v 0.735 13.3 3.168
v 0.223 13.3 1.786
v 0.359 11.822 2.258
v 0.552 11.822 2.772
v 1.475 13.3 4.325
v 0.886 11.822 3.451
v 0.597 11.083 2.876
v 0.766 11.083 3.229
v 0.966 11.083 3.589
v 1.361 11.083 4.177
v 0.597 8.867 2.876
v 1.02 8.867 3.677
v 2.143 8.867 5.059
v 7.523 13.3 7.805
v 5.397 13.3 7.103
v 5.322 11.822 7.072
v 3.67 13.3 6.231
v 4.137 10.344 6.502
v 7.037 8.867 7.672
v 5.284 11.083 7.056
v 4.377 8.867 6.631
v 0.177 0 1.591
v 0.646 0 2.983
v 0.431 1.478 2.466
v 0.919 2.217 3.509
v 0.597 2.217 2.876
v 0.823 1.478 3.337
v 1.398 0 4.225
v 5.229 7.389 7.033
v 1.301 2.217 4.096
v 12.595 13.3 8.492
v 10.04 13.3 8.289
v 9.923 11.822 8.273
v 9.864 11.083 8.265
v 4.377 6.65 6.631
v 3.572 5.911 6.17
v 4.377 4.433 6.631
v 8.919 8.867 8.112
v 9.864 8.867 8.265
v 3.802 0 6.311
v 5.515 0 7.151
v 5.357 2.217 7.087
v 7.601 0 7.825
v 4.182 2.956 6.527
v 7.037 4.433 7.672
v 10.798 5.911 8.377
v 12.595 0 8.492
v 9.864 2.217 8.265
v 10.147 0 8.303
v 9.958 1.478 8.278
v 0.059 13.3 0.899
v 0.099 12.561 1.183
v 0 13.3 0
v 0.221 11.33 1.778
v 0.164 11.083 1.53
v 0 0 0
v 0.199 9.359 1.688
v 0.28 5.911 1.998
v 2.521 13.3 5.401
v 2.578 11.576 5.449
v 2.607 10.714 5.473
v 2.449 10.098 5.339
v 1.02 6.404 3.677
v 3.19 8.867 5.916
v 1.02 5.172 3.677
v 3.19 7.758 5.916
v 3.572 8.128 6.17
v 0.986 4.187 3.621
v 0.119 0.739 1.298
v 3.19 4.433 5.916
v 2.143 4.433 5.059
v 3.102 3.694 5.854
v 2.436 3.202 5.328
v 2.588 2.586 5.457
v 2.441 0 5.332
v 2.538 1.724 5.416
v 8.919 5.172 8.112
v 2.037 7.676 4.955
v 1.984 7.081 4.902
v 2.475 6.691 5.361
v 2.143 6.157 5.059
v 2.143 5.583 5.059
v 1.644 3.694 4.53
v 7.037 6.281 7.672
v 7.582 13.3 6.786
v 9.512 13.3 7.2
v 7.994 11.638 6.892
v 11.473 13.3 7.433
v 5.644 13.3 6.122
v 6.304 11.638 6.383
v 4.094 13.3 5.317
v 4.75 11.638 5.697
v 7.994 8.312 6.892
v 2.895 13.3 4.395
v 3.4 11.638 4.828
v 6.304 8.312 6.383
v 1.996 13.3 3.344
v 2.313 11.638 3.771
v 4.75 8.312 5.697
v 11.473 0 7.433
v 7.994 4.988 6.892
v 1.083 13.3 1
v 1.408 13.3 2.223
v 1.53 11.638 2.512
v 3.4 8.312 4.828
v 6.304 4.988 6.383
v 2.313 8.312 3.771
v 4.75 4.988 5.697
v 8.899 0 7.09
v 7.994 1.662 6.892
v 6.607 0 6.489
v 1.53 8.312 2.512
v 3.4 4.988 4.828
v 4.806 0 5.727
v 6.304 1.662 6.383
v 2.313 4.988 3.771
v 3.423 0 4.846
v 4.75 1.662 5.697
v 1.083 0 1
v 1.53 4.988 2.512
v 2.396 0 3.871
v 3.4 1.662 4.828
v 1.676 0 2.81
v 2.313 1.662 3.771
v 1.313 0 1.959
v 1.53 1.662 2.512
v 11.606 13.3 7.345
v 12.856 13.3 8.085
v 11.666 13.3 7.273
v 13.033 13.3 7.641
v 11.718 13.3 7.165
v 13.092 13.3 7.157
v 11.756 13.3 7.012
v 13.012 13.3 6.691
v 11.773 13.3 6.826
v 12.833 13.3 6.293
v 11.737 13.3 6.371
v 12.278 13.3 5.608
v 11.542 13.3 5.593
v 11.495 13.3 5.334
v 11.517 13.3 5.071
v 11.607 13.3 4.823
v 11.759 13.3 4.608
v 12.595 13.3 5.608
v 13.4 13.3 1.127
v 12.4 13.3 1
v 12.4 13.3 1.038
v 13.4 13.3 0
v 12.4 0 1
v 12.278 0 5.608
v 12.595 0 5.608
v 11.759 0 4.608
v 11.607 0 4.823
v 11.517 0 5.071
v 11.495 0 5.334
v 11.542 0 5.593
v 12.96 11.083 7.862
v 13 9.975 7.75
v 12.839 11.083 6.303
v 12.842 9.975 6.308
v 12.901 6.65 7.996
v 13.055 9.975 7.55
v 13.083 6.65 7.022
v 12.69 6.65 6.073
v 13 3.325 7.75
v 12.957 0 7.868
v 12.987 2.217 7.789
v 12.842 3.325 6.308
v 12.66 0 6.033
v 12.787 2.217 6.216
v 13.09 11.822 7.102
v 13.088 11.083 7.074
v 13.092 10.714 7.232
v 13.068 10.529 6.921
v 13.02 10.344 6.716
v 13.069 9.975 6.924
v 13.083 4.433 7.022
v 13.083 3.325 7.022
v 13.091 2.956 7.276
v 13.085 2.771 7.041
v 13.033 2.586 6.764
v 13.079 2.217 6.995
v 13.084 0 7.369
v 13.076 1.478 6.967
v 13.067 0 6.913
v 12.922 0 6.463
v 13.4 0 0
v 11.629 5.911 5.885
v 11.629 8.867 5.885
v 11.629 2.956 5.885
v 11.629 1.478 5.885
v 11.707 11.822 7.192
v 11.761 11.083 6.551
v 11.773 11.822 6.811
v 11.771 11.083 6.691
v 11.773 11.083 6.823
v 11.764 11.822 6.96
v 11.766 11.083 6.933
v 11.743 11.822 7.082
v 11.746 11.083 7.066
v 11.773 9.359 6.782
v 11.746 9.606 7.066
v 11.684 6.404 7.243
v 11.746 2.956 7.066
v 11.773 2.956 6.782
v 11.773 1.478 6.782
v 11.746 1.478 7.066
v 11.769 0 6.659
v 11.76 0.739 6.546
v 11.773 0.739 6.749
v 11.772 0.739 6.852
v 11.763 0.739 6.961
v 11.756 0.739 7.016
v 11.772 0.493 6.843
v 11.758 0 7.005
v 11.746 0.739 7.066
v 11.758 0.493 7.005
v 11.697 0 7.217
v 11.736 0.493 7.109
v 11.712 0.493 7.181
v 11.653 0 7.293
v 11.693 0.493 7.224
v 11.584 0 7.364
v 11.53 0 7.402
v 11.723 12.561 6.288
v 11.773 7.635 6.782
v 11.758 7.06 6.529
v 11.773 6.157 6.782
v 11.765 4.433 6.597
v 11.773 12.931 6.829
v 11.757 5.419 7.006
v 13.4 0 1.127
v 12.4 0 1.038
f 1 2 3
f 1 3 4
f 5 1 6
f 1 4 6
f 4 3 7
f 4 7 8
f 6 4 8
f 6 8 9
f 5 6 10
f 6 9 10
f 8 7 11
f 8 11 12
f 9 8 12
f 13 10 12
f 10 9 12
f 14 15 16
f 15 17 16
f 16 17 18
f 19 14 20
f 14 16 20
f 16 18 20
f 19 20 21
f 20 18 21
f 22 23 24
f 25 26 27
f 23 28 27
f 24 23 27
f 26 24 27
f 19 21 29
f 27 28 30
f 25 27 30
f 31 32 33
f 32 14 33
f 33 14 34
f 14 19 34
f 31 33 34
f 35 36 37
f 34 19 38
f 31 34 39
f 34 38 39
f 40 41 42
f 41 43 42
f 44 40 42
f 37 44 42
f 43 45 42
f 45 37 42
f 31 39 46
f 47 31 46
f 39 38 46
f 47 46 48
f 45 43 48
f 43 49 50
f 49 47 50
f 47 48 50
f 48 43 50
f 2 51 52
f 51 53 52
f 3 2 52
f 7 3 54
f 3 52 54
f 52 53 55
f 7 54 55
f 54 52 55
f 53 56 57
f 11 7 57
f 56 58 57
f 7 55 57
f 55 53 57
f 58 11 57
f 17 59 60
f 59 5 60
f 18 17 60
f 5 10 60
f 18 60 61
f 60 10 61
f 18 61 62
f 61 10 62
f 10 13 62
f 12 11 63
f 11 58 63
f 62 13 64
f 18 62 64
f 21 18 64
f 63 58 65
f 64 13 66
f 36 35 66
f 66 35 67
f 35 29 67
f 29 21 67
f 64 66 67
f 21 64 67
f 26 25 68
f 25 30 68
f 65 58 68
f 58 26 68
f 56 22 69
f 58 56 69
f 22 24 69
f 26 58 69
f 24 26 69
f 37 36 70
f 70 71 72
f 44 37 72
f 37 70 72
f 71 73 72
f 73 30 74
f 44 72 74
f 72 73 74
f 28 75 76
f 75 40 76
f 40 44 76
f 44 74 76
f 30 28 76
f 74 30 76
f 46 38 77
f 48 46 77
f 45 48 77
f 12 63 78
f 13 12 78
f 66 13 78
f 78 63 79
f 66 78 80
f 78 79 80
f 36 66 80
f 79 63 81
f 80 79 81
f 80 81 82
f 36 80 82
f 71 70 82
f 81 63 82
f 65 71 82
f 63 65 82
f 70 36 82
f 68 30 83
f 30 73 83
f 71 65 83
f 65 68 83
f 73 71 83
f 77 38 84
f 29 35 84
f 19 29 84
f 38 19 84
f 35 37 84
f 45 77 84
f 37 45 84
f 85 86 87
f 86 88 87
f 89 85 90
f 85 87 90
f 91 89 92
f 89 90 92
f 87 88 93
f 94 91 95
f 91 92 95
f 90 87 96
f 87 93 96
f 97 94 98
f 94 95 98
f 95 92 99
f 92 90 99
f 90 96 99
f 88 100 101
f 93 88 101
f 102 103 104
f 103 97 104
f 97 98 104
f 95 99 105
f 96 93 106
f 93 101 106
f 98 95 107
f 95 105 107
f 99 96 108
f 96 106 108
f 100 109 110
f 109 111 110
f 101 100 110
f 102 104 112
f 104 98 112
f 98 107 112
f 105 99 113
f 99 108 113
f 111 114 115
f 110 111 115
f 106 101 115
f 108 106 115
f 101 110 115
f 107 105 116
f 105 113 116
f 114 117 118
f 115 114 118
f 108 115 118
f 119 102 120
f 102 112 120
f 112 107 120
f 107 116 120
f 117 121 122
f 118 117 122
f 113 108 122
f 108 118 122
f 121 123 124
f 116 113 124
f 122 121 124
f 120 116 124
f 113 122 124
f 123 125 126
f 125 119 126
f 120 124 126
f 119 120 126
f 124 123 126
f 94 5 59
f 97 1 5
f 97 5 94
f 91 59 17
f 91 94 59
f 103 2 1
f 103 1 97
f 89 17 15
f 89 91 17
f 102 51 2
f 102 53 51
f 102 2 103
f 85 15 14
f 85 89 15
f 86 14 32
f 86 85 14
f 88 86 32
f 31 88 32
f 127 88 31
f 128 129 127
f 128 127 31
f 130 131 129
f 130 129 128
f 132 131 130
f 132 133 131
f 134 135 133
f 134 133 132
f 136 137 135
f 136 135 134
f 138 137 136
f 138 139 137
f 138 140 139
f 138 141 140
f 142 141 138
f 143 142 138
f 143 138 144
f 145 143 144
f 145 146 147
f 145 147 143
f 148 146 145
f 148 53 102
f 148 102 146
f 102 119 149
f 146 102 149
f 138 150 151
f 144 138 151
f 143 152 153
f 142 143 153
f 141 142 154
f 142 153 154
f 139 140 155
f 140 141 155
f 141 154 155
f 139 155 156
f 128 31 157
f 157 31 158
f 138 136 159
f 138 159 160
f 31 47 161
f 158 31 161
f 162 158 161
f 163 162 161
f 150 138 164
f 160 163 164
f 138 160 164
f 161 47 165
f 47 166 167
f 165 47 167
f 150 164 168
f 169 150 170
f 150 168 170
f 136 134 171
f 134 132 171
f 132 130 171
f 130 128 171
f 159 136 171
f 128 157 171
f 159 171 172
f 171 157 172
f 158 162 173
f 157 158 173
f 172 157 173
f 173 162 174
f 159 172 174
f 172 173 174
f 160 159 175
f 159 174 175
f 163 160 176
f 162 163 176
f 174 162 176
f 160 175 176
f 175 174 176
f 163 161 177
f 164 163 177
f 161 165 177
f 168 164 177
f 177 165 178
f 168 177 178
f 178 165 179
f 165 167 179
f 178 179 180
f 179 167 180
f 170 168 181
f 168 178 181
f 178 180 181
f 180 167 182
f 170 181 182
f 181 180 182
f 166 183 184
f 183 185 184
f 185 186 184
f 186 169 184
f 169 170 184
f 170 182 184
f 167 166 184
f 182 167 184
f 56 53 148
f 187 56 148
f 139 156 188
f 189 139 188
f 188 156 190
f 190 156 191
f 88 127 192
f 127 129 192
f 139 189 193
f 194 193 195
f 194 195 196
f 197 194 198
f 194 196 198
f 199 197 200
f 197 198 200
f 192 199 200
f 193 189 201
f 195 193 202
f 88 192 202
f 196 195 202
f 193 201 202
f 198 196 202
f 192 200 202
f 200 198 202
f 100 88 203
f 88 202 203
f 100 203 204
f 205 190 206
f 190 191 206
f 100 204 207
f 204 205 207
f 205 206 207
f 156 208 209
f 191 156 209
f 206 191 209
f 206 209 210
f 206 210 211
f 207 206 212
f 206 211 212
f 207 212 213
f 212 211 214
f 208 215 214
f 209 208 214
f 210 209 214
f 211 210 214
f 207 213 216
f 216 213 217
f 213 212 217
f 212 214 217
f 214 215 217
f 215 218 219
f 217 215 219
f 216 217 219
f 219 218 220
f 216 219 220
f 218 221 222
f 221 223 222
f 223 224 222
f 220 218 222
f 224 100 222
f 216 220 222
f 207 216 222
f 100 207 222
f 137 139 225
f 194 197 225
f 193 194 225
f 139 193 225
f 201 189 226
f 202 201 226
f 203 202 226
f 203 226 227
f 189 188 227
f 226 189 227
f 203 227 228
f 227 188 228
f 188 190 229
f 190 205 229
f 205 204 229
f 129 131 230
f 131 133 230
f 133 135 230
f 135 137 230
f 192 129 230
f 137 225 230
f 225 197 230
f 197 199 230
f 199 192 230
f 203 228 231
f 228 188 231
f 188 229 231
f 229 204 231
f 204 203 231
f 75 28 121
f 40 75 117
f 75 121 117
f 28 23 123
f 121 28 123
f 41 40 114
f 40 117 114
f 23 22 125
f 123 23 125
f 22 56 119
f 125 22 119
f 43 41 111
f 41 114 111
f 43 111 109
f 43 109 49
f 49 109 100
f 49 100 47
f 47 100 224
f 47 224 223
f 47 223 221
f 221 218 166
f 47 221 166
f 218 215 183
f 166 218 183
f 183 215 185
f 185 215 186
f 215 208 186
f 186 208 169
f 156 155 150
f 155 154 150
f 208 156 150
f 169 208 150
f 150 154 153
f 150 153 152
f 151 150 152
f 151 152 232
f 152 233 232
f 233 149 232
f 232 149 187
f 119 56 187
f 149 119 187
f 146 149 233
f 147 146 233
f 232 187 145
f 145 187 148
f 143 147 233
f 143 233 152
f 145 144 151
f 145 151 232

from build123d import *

# Parameters (mm, degrees)
SKETCH1_W           = 13.4
SKETCH1_H           = 13.3
BOSS_EXTRUDE1_DEPTH = 8.5
CUT_EXTRUDE1_DEPTH  = 21.705071842
CUT_EXTRUDE3_DEPTH  = 21.705072012
CUT_EXTRUDE4_DEPTH  = 21.701642146
FILLET1_R           = 1


with BuildPart() as part:
    # Sketch1 → Boss-Extrude1 (new body)
    with BuildSketch(Plane.XY):
        with Locations((6.7, 6.65)):
            Rectangle(SKETCH1_W, SKETCH1_H)
    extrude(amount=BOSS_EXTRUDE1_DEPTH)

    # Sketch2 → Cut-Extrude1 (cut, through all)
    with BuildSketch(Plane.XZ):
        with BuildLine():
            Line((0, 8.5), (0, 0))
            add(Edge.make_bspline(
                [(0, 0), (0.073718654, 6.709903839), (7.883498374, 8.466123585), (13.091968121, 8.5)],
                knots=[0, 0, 0, 0, 0.980472066, 0.980472066, 0.980472066, 0.980472066], degree=3))
            Line((13.091968121, 8.5), (0, 8.5))
        make_face()
    extrude(amount=-CUT_EXTRUDE1_DEPTH, mode=Mode.SUBTRACT)

    # Sketch3 → Cut-Extrude3 (cut, through all)
    with BuildSketch(Plane.XZ):
        with BuildLine():
            Line((13.4, 8.5), (13.091968233, 8.5))
            add(Edge.make_bspline(
                [(13.091968233, 8.500000001), (12.928751092, 8.498938421), (12.762979466, 8.4961855), (12.594971465, 8.491641803)],
                knots=[0, 0, 0, 0, 0.030724926, 0.030724926, 0.030724926, 0.030724926], degree=3))
            add(Edge.make_bspline(
                [(12.594971465, 8.491641803), (13.729005702, 6.994828786), (12.27798969, 5.607801465)],
                knots=[0, 0, 0, 1, 1, 1], degree=2))
            Line((12.27798969, 5.607801465), (12.594971465, 5.607801465))
            Line((12.594971465, 5.607801465), (13.4, 1.126740045))
            Line((13.4, 1.126740045), (13.4, 8.5))
        make_face()
    extrude(amount=-CUT_EXTRUDE3_DEPTH, mode=Mode.SUBTRACT)

    # Sketch4 → Cut-Extrude4 (cut, through all)
    with BuildSketch(Plane.XZ):
        with BuildLine():
            add(Edge.make_bspline(
                [(11.162050454, 4.607801465), (11.213167508, 4.724451541), (11.314763824, 4.965389249), (11.483094832, 5.403338852), (11.643196268, 5.901128047), (11.751940563, 6.402221541), (11.783684476, 6.800842723), (11.752398283, 7.085240041), (11.683853846, 7.255919003), (11.613948948, 7.348822838), (11.519214994, 7.411341569), (11.47258496, 7.432985767)],
                knots=[0.498991895, 0.498991895, 0.498991895, 0.498991895, 0.49906673, 0.499141565, 0.499291234, 0.499440904, 0.499590574, 0.499740243, 0.499889913, 0.500039582, 0.500189252, 0.500189252, 0.500189252, 0.500189252], degree=3))
            add(Edge.make_bspline(
                [(11.47258496, 7.432985767), (10.893745911, 7.38920843), (9.751249116, 7.261972079), (7.393841399, 6.805923692), (5.169270178, 6.017857558), (3.35518405, 4.858338166), (2.262837237, 3.805038418), (1.60534323, 2.759077747), (1.24696522, 1.808375346), (1.124623135, 1.267320349), (1.082503612, 1)],
                knots=[0.071068841, 0.071068841, 0.071068841, 0.071068841, 0.173545681, 0.276022522, 0.480976203, 0.583453043, 0.685929884, 0.788406724, 0.839645145, 0.890883565, 0.890883565, 0.890883565, 0.890883565], degree=3))
            Line((1.082503612, 1), (12.4, 1))
            Line((12.4, 1), (12.4, 1.037627698))
            Line((12.4, 1.037627698), (11.758613621, 4.607801465))
            Line((11.758613621, 4.607801465), (11.162050454, 4.607801465))
        make_face()
    extrude(amount=-CUT_EXTRUDE4_DEPTH, mode=Mode.SUBTRACT)

    # Fillet1
    # the kernel refuses this fillet: 1 mm, written as the material it takes off along each edge
    with BuildSketch(Plane(origin=(11.162050454, -2.640459986, 4.607801465), x_dir=(1, 0, 0), z_dir=(0, 1, 0))) as fillet1_piece_1:
        with BuildLine():
            CenterArc((1.331493249, -0.678142887), FILLET1_R, 137.301308413, 60.598480339)
            Line((0.379897712, -0.985495996), (0.360865801, -0.991643059))
            ThreePointArc((0.360865801, -0.991643059), (0.183572865, -0.495225733), (-0.018318378, -0.008027269))
            Line((-0.018318378, -0.008027269), (0, 0.02))
            ThreePointArc((0, 0.02), (0.298281584, 0.02), (0.581864566, 0.013562858))
            Line((0.581864566, 0.013562858), (0.596563167, 0))
        make_face()
    extrude(amount=18.580919972, mode=Mode.SUBTRACT)


solid = part.part
